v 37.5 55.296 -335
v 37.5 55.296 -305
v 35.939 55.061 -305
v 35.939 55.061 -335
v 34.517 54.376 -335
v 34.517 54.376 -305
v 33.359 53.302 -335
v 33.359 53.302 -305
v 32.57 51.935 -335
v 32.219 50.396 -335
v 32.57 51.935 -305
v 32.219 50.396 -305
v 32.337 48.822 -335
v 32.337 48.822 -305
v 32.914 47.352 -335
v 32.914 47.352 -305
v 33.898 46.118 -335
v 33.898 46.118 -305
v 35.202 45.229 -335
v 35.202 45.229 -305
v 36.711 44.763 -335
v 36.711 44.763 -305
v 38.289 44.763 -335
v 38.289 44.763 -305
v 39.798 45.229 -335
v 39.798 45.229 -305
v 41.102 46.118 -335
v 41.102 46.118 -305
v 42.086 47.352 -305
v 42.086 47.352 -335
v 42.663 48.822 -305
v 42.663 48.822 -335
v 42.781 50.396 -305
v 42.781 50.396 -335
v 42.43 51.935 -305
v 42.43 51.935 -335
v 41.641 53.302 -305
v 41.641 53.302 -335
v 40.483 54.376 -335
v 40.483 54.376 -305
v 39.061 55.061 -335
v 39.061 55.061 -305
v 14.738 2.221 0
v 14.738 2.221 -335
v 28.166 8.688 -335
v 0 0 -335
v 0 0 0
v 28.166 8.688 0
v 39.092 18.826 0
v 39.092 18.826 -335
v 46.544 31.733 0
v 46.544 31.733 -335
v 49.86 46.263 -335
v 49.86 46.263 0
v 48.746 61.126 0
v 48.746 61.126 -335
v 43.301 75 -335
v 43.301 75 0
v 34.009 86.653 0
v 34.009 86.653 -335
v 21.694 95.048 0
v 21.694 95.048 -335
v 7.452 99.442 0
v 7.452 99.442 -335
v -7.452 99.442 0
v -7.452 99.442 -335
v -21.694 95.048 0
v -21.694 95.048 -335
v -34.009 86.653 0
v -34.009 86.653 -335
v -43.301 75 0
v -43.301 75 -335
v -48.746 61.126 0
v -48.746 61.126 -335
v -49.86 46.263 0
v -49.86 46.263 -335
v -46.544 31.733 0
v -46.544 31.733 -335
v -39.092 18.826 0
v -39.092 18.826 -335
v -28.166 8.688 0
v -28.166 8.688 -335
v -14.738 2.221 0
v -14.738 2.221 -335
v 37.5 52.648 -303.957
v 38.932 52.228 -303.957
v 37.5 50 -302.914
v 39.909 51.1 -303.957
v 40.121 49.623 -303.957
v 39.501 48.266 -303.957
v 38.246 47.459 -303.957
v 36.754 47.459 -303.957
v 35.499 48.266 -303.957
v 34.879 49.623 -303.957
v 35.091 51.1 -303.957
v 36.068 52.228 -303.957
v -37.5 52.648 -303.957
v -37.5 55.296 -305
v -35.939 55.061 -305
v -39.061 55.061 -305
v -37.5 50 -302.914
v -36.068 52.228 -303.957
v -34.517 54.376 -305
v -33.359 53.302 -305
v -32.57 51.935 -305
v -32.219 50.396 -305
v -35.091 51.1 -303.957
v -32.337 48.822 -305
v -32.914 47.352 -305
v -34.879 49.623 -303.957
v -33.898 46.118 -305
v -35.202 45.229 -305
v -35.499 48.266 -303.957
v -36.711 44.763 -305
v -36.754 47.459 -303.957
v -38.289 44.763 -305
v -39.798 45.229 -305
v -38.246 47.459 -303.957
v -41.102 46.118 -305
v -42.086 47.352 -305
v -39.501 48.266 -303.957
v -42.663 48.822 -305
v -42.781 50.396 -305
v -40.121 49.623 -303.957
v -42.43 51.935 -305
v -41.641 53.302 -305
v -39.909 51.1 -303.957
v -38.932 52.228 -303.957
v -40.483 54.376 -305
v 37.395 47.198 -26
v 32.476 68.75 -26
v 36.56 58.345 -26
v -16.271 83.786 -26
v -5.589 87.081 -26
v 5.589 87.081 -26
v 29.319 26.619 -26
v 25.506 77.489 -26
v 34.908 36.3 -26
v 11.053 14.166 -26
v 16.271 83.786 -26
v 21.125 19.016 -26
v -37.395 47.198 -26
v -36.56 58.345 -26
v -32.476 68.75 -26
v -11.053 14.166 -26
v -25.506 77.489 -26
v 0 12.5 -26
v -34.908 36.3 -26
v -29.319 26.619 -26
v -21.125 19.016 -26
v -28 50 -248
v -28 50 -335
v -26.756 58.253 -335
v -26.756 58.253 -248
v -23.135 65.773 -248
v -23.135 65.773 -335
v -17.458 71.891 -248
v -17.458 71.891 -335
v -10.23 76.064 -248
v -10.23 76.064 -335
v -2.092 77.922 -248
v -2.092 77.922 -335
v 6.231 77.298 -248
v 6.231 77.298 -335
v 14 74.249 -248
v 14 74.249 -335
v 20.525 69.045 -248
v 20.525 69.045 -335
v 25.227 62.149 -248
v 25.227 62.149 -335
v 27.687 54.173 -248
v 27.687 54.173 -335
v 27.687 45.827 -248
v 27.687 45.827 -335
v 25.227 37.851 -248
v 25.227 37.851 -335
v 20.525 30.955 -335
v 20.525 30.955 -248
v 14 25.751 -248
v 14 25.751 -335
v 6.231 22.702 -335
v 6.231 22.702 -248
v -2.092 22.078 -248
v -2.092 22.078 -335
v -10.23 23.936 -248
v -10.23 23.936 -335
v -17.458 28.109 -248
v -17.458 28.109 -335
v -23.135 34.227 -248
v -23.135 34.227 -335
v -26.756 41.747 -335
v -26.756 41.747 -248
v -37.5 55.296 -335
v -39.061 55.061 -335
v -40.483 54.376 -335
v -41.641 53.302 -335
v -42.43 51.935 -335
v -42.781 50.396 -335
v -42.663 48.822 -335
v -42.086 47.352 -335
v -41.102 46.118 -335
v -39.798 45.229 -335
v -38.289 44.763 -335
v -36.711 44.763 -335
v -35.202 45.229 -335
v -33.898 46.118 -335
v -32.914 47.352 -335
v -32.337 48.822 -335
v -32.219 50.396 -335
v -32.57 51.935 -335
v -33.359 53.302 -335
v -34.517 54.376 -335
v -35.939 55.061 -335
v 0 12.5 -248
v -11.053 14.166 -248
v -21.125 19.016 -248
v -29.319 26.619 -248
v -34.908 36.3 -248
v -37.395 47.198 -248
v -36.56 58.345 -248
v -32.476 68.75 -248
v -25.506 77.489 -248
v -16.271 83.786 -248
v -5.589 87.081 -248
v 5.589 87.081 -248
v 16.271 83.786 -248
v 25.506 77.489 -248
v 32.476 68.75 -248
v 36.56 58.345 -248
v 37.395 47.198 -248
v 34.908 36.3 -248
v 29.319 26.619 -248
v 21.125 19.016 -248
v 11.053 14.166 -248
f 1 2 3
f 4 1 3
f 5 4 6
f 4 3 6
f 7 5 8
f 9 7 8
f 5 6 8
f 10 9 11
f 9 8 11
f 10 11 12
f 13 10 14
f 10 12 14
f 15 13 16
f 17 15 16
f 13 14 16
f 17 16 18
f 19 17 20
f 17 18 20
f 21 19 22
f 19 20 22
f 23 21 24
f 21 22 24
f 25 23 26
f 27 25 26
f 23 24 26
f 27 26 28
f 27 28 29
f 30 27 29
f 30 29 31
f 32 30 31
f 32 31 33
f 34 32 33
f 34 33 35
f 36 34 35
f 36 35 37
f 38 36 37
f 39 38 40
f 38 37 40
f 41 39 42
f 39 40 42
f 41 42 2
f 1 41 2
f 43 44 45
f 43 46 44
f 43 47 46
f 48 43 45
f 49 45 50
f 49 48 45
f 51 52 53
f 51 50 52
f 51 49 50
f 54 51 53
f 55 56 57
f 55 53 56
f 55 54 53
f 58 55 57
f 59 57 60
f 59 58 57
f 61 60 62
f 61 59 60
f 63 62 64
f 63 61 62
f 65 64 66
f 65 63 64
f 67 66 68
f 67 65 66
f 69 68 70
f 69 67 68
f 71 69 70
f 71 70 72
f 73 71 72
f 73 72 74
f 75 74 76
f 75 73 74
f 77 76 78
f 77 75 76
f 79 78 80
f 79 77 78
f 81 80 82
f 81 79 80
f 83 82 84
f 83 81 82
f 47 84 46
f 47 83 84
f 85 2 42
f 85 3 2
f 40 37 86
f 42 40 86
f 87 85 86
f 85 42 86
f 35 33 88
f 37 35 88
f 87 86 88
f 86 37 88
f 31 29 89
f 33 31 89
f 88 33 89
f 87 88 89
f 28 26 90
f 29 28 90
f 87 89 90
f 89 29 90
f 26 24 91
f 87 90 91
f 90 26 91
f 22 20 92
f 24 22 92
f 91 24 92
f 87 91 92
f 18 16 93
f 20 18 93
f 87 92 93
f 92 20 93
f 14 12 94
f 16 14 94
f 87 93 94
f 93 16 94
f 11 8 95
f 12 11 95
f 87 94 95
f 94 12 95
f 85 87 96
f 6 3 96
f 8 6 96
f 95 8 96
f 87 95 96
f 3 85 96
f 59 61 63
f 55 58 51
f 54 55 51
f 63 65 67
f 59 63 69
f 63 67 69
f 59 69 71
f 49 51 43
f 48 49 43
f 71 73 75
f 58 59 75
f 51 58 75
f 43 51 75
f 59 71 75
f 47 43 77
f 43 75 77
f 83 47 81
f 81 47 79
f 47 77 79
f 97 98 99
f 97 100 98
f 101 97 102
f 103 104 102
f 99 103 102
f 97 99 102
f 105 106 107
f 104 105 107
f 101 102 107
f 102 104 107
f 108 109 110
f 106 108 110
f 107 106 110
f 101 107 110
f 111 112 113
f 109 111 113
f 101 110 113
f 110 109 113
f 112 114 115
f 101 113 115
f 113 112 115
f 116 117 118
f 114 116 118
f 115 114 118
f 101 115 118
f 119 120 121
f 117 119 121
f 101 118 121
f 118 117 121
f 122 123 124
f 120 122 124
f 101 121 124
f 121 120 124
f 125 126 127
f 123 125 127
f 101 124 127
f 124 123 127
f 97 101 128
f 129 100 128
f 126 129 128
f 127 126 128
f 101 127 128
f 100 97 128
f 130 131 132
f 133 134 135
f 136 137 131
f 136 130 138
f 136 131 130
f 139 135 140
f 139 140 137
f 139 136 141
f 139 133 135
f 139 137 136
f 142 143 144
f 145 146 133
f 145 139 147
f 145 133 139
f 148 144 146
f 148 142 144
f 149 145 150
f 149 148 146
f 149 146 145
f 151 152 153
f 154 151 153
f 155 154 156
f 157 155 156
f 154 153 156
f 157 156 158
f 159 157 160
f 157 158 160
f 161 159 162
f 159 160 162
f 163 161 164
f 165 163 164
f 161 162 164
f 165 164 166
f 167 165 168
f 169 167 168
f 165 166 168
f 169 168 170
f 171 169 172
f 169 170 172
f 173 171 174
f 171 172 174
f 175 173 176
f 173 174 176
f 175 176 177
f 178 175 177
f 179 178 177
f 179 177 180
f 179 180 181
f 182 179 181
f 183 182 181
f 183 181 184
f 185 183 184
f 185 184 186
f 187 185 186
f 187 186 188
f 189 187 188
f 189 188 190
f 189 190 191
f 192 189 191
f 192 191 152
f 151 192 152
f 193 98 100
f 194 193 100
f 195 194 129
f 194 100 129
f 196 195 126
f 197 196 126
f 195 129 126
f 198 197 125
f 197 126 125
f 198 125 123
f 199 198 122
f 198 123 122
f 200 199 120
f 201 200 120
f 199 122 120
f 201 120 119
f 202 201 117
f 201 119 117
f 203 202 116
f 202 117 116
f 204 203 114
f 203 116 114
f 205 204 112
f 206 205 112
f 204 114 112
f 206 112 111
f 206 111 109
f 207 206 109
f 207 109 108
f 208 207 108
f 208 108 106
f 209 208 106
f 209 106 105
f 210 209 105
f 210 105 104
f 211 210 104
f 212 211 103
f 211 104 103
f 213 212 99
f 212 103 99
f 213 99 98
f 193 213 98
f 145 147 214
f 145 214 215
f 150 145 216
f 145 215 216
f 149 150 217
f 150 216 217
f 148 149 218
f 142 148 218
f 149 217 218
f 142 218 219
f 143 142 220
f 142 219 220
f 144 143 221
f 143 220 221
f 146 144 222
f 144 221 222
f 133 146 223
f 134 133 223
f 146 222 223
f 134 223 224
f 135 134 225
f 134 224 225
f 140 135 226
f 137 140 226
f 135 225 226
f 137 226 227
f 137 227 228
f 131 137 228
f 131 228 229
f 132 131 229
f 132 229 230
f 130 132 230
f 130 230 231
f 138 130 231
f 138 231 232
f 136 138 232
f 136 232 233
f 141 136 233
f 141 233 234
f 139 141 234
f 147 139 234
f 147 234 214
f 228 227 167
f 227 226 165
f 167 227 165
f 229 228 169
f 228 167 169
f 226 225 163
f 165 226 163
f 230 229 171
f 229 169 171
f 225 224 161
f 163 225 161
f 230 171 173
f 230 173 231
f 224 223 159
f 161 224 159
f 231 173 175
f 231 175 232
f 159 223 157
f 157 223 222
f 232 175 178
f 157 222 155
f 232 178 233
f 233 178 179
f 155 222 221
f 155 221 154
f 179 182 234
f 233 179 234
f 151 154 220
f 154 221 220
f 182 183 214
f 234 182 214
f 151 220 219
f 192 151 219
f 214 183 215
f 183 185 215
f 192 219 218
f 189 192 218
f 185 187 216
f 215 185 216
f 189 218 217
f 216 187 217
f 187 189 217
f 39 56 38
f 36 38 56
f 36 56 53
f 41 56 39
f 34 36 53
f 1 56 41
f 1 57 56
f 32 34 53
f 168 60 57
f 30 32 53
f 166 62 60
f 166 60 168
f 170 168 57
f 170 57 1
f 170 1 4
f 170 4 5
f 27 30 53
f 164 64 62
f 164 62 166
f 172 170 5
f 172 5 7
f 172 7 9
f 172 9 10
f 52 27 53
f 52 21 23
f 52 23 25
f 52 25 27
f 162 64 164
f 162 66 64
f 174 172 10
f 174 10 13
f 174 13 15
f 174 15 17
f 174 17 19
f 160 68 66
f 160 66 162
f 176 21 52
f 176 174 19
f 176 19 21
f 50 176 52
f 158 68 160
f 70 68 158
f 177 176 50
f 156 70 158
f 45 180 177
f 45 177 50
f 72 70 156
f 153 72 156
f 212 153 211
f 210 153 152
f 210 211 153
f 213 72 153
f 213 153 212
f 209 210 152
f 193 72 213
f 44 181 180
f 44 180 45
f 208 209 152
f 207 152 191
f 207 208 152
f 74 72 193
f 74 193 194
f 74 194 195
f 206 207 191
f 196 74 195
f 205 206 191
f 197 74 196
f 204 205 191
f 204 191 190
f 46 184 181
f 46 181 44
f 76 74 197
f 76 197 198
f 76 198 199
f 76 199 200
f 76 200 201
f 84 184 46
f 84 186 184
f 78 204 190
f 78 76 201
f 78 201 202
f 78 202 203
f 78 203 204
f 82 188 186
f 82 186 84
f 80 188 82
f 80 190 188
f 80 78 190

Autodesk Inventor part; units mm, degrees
ref_plane "YZ Plane" through (0, 0, 0) normal (1, 0, 0) x (0, 1, 0)
ref_plane "XZ Plane" through (0, 0, 0) normal (0, 1, 0) x (-1, 0, 0)
ref_plane "XY Plane" through (0, 0, 0) normal (0, 0, 1) x (1, 0, 0)
sketch "Sketch2" plane through (0, 0, 0) normal (1, 0, 0) x (0, 1, 0)
  line L0 (0, 0) -> (50, 0)
  line L1 (50, -335) -> (0, -335)
  line L2 (0, -335) -> (0, 0)
  line L3 (0, 0) -> (50, 0)
  line L4 (50, 0) -> (50, -26)
  line L5 (50, -26) -> (12.5, -26)
  line L6 (50, -335) -> (50, -248)
  line L7 (50, -248) -> (12.5, -248)
  line L8 (12.5, -26) -> (12.5, -248)
  line L9 (0, -335) -> (0, -465) construction
  dimension "d4" = 50
  dimension "d7" = 335
  dimension "d8" = 50
  dimension "d9" = 26
  dimension "d10" = 37.5
  dimension "d12" = 37.5
  dimension "d20" = 87
revolve "Revolution1" add sketch "Sketch2" angle 360 about axis through (0, 50, 0) along (0, 0, -1)
sketch "Sketch3" plane through (0, 50, -335) normal (0, 0, -1) x (-1, 0, 0)
  circle A0 centre (0, 0) radius 28
  point P0 (0, -50)
  dimension "d14" = 56
extrude "Extrusion2" cut sketch "Sketch3" against normal blind 309
sketch "Sketch4" plane through (0, 50, -335) normal (0, 0, -1) x (-1, 0, 0)
  circle A0 centre (0, 0) radius 37.5 projected
  point P0 (0, -50)
  point P1 (37.5, 0)
  point P2 (-37.5, 0)
  dimension "d21" = 37.5
  dimension "d22" = 37.5
hole "Hole1" at (-37.5, 50, -335) at (37.5, 50, -335) direction (0, 0, 1) diameter 10.5918 depth 30 tip angle 137 thread size "1/2-13 UNC" class "2B" standard "ANSI Unified Screw Threads"
equation "\"d22\" = d21"
equation "\"d4\" = d8"
equation "\"d12\" = d10"
properties part number "CilindroHidraulico_1"
